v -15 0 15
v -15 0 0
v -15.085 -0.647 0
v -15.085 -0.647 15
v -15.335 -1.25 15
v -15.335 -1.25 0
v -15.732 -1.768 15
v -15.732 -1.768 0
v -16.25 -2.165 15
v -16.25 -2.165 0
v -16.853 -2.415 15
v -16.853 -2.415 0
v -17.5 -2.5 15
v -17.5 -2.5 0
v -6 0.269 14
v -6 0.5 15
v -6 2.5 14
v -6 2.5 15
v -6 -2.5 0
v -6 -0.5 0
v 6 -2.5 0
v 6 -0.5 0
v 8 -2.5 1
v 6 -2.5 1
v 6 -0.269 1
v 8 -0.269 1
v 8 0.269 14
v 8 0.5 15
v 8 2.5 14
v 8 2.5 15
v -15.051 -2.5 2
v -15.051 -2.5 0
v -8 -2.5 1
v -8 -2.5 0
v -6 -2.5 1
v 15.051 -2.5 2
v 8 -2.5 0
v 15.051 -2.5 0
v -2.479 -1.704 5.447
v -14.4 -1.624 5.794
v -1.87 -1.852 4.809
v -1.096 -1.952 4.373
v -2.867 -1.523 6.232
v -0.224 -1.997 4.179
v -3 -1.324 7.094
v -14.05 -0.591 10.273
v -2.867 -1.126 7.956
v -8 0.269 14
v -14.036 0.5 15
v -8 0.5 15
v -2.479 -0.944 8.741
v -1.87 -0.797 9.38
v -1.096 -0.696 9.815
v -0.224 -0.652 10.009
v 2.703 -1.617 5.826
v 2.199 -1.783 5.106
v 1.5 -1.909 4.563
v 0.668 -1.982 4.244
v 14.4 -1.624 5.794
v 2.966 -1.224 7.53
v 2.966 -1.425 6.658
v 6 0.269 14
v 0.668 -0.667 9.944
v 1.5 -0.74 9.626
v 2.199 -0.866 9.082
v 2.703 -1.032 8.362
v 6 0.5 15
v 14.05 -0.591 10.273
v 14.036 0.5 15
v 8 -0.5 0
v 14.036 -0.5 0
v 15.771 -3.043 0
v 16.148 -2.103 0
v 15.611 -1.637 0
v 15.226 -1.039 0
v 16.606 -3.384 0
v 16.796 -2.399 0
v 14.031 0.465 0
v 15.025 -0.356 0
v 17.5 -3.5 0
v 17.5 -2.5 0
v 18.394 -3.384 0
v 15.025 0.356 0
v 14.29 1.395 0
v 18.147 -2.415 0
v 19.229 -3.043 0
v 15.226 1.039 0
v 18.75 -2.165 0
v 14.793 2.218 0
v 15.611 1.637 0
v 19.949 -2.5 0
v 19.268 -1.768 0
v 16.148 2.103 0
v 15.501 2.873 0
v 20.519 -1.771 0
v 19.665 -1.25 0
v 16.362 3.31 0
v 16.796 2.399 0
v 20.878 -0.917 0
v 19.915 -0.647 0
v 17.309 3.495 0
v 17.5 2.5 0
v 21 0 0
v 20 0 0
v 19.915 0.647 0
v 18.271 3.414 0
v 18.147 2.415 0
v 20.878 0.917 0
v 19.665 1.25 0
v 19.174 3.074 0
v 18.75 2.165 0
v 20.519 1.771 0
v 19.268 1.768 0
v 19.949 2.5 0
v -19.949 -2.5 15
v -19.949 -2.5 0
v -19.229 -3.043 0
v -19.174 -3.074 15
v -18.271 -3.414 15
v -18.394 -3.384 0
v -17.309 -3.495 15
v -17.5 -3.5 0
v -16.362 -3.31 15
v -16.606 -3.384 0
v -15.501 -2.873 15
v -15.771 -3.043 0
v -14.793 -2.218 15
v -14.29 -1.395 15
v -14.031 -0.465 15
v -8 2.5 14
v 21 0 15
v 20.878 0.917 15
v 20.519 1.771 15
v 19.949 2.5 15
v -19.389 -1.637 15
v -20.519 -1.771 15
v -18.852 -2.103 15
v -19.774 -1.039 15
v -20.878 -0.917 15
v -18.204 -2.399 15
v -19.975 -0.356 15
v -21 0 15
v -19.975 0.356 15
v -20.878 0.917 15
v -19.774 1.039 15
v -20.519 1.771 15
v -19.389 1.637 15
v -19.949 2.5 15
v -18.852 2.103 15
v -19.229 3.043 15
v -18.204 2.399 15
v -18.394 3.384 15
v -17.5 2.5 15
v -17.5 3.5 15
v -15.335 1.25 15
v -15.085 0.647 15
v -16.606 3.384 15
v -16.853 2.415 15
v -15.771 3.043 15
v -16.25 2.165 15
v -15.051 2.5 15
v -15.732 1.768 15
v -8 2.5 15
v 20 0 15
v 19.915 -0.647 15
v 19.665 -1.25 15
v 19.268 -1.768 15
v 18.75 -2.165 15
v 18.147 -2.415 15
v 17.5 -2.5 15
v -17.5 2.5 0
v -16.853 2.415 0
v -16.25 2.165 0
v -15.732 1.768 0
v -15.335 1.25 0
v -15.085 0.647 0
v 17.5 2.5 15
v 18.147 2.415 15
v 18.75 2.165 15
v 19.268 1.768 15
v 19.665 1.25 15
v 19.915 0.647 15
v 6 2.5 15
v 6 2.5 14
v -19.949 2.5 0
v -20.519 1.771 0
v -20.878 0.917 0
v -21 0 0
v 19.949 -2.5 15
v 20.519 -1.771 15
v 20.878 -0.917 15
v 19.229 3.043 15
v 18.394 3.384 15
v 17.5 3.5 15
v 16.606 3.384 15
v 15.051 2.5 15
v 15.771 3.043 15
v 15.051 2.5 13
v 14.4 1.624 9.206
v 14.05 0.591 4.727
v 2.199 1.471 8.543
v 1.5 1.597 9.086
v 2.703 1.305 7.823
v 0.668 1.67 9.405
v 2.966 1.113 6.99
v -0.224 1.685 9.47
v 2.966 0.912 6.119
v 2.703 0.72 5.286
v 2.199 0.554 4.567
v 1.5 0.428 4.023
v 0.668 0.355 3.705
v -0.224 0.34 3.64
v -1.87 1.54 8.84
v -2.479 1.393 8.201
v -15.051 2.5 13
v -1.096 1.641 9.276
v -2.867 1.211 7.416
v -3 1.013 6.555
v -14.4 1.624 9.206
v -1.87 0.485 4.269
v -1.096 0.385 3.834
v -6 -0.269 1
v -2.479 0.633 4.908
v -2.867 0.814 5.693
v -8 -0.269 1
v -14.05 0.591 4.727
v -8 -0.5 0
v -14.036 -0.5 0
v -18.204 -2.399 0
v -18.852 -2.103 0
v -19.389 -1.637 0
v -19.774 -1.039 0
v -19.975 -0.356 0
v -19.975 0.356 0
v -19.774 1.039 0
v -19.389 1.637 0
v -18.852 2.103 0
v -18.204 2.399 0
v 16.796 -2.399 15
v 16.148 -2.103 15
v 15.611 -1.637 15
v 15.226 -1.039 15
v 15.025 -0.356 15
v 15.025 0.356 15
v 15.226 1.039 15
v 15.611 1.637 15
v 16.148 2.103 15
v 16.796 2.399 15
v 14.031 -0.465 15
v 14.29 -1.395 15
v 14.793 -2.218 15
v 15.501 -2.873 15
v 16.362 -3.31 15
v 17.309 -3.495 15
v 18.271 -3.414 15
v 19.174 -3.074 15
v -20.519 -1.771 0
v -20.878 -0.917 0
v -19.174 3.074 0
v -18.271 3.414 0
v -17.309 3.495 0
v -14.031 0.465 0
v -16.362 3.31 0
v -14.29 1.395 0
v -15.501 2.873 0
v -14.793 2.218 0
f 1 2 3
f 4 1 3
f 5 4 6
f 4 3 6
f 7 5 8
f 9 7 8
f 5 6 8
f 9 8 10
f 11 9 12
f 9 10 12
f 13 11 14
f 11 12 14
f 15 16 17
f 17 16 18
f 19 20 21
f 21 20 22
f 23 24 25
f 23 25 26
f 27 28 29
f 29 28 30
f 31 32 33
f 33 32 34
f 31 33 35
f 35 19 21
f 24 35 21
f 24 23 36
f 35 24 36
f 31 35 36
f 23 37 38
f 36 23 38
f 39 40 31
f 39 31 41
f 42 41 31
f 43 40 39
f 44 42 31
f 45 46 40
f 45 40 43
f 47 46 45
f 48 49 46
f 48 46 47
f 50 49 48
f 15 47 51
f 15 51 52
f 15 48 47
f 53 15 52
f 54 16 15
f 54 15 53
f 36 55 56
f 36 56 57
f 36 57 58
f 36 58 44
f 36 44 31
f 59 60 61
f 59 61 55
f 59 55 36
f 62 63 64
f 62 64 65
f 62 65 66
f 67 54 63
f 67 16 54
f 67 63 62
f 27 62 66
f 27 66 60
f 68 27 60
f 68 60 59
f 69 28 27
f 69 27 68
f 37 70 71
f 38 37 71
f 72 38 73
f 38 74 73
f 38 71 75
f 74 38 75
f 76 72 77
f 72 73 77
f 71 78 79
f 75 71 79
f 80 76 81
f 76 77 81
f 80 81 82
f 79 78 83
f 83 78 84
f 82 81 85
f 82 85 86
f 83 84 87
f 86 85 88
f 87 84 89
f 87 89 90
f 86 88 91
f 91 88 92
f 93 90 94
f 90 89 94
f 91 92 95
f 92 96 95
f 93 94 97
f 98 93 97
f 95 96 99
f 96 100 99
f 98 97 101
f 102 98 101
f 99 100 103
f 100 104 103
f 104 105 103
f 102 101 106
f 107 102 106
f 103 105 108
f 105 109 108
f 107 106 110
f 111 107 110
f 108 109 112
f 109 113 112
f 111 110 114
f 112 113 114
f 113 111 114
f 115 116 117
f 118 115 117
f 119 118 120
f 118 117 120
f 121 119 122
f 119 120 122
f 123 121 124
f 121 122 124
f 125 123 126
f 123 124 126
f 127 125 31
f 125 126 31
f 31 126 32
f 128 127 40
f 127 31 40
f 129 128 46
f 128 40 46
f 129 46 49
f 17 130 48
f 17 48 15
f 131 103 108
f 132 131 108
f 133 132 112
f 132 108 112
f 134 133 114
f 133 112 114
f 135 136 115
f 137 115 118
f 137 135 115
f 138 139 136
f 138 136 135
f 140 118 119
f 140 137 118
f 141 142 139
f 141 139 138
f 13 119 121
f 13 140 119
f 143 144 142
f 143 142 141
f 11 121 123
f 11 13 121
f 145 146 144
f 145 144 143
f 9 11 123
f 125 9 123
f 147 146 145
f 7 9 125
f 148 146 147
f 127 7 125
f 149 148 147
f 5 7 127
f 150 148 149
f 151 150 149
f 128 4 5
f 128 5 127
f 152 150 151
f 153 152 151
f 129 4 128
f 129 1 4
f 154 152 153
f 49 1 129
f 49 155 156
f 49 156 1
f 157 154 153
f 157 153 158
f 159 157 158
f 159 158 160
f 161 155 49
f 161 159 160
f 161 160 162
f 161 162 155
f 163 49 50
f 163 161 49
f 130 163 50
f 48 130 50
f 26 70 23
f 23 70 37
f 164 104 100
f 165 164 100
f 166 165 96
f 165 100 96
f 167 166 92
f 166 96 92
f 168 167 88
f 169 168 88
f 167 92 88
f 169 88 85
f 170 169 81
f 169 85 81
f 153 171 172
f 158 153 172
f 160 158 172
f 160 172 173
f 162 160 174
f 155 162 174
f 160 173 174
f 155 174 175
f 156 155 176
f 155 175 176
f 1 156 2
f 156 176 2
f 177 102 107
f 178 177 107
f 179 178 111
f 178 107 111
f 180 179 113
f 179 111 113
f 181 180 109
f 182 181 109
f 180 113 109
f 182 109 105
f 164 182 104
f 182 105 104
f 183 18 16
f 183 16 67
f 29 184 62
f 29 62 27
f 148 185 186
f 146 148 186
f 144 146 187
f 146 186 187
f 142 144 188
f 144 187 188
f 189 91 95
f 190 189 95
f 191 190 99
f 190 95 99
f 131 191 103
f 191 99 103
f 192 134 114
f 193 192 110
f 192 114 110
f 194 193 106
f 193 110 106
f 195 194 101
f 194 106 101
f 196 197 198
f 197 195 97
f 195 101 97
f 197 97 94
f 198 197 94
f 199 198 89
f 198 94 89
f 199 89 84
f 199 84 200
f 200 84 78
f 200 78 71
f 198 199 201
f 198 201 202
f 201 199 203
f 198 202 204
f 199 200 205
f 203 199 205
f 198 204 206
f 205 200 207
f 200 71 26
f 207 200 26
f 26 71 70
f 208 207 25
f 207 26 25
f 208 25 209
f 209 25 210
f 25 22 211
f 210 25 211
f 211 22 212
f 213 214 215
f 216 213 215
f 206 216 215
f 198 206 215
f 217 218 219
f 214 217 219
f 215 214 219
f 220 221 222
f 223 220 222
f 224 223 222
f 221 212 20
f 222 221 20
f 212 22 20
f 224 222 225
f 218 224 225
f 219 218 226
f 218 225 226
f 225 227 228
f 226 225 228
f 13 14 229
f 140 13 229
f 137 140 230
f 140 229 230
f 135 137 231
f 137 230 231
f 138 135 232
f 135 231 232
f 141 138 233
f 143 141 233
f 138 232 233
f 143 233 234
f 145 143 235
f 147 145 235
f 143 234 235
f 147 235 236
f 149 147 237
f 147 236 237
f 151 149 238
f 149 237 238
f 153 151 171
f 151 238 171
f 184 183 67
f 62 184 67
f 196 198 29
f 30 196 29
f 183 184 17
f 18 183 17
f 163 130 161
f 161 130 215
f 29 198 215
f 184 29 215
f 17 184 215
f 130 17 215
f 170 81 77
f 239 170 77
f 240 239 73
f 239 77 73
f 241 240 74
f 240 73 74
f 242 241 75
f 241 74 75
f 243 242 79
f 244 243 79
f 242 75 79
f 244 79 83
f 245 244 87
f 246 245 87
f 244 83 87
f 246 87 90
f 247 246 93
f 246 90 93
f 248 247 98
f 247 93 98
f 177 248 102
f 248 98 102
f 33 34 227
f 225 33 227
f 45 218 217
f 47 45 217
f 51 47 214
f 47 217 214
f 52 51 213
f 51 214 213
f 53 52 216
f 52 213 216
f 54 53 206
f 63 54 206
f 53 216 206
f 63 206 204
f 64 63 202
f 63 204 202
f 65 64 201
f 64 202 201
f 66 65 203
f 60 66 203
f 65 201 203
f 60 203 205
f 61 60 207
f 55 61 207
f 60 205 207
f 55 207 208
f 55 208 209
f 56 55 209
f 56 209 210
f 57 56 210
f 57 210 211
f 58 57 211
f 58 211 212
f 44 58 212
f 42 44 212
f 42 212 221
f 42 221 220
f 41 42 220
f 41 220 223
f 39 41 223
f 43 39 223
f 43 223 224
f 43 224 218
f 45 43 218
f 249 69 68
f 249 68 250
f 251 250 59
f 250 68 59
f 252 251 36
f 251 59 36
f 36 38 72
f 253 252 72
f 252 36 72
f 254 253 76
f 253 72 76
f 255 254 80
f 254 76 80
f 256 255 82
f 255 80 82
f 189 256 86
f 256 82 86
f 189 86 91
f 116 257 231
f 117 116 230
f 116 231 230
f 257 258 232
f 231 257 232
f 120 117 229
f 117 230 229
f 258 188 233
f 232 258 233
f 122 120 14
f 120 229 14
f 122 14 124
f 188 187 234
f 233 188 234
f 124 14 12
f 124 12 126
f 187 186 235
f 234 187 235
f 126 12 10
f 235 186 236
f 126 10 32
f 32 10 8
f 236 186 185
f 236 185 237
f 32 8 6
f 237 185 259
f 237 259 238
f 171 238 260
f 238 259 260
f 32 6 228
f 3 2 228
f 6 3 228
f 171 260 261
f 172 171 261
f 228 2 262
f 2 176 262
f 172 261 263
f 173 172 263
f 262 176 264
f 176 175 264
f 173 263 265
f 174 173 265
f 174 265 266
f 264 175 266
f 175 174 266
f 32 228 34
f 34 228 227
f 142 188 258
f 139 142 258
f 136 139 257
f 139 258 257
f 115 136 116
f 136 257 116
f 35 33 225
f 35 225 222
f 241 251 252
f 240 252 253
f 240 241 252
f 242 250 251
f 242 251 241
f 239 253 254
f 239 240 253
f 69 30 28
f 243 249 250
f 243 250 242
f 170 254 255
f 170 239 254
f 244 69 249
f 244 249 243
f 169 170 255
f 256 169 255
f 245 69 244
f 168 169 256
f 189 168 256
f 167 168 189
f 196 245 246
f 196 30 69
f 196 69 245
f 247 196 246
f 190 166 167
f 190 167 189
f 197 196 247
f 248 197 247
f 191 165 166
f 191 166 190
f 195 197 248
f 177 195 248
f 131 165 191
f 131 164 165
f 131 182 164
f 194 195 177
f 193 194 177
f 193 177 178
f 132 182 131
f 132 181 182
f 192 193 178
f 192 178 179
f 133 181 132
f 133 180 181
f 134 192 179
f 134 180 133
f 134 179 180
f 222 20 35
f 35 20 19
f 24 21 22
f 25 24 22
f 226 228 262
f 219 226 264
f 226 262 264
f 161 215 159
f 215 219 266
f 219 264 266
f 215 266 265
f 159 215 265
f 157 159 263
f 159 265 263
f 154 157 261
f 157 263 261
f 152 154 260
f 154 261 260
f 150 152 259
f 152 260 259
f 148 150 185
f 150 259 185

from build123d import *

# Parameters (mm, degrees)
F1_DEPTH = 15
F2_SIZE2 = 3
F2_SIZE  = 13
F3_SIZE2 = 3
F3_SIZE  = 13
F4_R     = 3
F5_DEPTH = 25
F6_W     = 2
F6_H     = 0.5
F6_H_2   = 2
F7_DEPTH = 1
F8_W     = 2
F8_H     = 0.5
F8_H_2   = 2
F9_DEPTH = 1


with BuildPart() as f1:
    # F0 (on Top) → F1 (new body)
    with BuildSketch(Plane.XY):
        with BuildLine():
            Line((-17.5, 2.5), (-15.0505102572, 2.5))
            ThreePointArc((-15.0505102572, 2.5), (-17.5, 3.5), (-19.9494897428, 2.5))
            Line((-19.9494897428, 2.5), (-17.5, 2.5))
        make_face()
        with BuildLine():
            ThreePointArc((-17.5, -2.5), (-20, 0), (-17.5, 2.5))
            Line((-17.5, 2.5), (-19.9494897428, 2.5))
            ThreePointArc((-19.9494897428, 2.5), (-20.7267021942, 1.3558735008), (-21, 0))
            ThreePointArc((-21, 0), (-20.7267021942, -1.3558735008), (-19.9494897428, -2.5))
            Line((-19.9494897428, -2.5), (-17.5, -2.5))
        make_face()
        with BuildLine():
            ThreePointArc((-19.9494897428, -2.5), (-17.5, -3.5), (-15.0505102572, -2.5))
            Line((-15.0505102572, -2.5), (-17.5, -2.5))
            Line((-17.5, -2.5), (-19.9494897428, -2.5))
        make_face()
        with BuildLine():
            ThreePointArc((-14, 0), (-14.2732978058, 1.3558735008), (-15.0505102572, 2.5))
            Line((-15.0505102572, 2.5), (-17.5, 2.5))
            ThreePointArc((-17.5, 2.5), (-15.732233047, 1.767766953), (-15, 0))
            ThreePointArc((-15, 0), (-15.732233047, -1.767766953), (-17.5, -2.5))
            Line((-17.5, -2.5), (-15.0505102572, -2.5))
            ThreePointArc((-15.0505102572, -2.5), (-14.2732978058, -1.3558735008), (-14, 0))
        make_face()
        with BuildLine():
            ThreePointArc((15.0505102572, -2.5), (14, 0), (15.0505102572, 2.5))
            Line((15.0505102572, 2.5), (-15.0505102572, 2.5))
            ThreePointArc((-15.0505102572, 2.5), (-14.2732978058, 1.3558735008), (-14, 0))
            ThreePointArc((-14, 0), (-14.2732978058, -1.3558735008), (-15.0505102572, -2.5))
            Line((-15.0505102572, -2.5), (15.0505102572, -2.5))
        make_face()
        with BuildLine():
            ThreePointArc((17.5, -2.5), (15, 0), (17.5, 2.5))
            Line((17.5, 2.5), (15.0505102572, 2.5))
            ThreePointArc((15.0505102572, 2.5), (14, 0), (15.0505102572, -2.5))
            Line((15.0505102572, -2.5), (17.5, -2.5))
        make_face()
        with BuildLine():
            Line((17.5, 2.5), (19.9494897428, 2.5))
            ThreePointArc((19.9494897428, 2.5), (17.5, 3.5), (15.0505102572, 2.5))
            Line((15.0505102572, 2.5), (17.5, 2.5))
        make_face()
        with BuildLine():
            ThreePointArc((21, 0), (20.7267021942, 1.3558735008), (19.9494897428, 2.5))
            Line((19.9494897428, 2.5), (17.5, 2.5))
            ThreePointArc((17.5, 2.5), (19.267766953, 1.767766953), (20, 0))
            ThreePointArc((20, 0), (19.267766953, -1.767766953), (17.5, -2.5))
            Line((17.5, -2.5), (19.9494897428, -2.5))
            ThreePointArc((19.9494897428, -2.5), (20.7267021942, -1.3558735008), (21, 0))
        make_face()
        with BuildLine():
            ThreePointArc((15.0505102572, -2.5), (17.5, -3.5), (19.9494897428, -2.5))
            Line((19.9494897428, -2.5), (17.5, -2.5))
            Line((17.5, -2.5), (15.0505102572, -2.5))
        make_face()
    extrude(amount=F1_DEPTH)

    # F2
    f2_edges = [f1.edges().sort_by_distance(p)[0] for p in [
        (0, -2.5, 15),
    ]]
    f2_side = f1.faces().sort_by_distance((0, -2.5, 7.5))[0]
    chamfer(f2_edges, length=F2_SIZE, length2=F2_SIZE2, reference=f2_side)

    # F3
    f3_edges = [f1.edges().sort_by_distance(p)[0] for p in [
        (0, 2.5, 0),
    ]]
    f3_side = f1.faces().sort_by_distance((0, 2.5, 7.5))[0]
    chamfer(f3_edges, length=F3_SIZE, length2=F3_SIZE2, reference=f3_side)

    # F4 (on face) → F5 (cut)
    with BuildSketch(Plane(origin=(0, -0.4747191011, 0.1095505618), x_dir=(-1, 0, 0), z_dir=(0, 0.9743911957, -0.2248595067))):
        with Locations((0, 6.6146171554)):
            Circle(F4_R)
    extrude(amount=-F5_DEPTH, mode=Mode.SUBTRACT)

    # F6 (on face) → F7 (cut)
    with BuildSketch(Plane.XY.offset(15)):
        with Locations((7, 0.25)):
            Rectangle(F6_W, F6_H)
        with Locations((-7, 0.25)):
            Rectangle(F6_W, F6_H)
        with Locations((-7, 1.5)):
            Rectangle(F6_W, F6_H_2)
        with Locations((-7, 2.75)):
            Rectangle(F6_W, F6_H)
        with Locations((7, 1.5)):
            Rectangle(F6_W, F6_H_2)
        with Locations((7, 2.75)):
            Rectangle(F6_W, F6_H)
    extrude(amount=-F7_DEPTH, mode=Mode.SUBTRACT)

    # F8 (on face) → F9 (cut)
    with BuildSketch(Plane(origin=(0, 0, 0), x_dir=(1, 0, 0), z_dir=(0, 0, -1))):
        with Locations((7, 0.25)):
            Rectangle(F8_W, F8_H)
        with Locations((7, 1.5)):
            Rectangle(F8_W, F8_H_2)
        with Locations((7, 2.75)):
            Rectangle(F8_W, F8_H)
        with Locations((-7, 0.25)):
            Rectangle(F8_W, F8_H)
        with Locations((-7, 1.5)):
            Rectangle(F8_W, F8_H_2)
        with Locations((-7, 2.75)):
            Rectangle(F8_W, F8_H)
    extrude(amount=-F9_DEPTH, mode=Mode.SUBTRACT)


solid = f1.part
